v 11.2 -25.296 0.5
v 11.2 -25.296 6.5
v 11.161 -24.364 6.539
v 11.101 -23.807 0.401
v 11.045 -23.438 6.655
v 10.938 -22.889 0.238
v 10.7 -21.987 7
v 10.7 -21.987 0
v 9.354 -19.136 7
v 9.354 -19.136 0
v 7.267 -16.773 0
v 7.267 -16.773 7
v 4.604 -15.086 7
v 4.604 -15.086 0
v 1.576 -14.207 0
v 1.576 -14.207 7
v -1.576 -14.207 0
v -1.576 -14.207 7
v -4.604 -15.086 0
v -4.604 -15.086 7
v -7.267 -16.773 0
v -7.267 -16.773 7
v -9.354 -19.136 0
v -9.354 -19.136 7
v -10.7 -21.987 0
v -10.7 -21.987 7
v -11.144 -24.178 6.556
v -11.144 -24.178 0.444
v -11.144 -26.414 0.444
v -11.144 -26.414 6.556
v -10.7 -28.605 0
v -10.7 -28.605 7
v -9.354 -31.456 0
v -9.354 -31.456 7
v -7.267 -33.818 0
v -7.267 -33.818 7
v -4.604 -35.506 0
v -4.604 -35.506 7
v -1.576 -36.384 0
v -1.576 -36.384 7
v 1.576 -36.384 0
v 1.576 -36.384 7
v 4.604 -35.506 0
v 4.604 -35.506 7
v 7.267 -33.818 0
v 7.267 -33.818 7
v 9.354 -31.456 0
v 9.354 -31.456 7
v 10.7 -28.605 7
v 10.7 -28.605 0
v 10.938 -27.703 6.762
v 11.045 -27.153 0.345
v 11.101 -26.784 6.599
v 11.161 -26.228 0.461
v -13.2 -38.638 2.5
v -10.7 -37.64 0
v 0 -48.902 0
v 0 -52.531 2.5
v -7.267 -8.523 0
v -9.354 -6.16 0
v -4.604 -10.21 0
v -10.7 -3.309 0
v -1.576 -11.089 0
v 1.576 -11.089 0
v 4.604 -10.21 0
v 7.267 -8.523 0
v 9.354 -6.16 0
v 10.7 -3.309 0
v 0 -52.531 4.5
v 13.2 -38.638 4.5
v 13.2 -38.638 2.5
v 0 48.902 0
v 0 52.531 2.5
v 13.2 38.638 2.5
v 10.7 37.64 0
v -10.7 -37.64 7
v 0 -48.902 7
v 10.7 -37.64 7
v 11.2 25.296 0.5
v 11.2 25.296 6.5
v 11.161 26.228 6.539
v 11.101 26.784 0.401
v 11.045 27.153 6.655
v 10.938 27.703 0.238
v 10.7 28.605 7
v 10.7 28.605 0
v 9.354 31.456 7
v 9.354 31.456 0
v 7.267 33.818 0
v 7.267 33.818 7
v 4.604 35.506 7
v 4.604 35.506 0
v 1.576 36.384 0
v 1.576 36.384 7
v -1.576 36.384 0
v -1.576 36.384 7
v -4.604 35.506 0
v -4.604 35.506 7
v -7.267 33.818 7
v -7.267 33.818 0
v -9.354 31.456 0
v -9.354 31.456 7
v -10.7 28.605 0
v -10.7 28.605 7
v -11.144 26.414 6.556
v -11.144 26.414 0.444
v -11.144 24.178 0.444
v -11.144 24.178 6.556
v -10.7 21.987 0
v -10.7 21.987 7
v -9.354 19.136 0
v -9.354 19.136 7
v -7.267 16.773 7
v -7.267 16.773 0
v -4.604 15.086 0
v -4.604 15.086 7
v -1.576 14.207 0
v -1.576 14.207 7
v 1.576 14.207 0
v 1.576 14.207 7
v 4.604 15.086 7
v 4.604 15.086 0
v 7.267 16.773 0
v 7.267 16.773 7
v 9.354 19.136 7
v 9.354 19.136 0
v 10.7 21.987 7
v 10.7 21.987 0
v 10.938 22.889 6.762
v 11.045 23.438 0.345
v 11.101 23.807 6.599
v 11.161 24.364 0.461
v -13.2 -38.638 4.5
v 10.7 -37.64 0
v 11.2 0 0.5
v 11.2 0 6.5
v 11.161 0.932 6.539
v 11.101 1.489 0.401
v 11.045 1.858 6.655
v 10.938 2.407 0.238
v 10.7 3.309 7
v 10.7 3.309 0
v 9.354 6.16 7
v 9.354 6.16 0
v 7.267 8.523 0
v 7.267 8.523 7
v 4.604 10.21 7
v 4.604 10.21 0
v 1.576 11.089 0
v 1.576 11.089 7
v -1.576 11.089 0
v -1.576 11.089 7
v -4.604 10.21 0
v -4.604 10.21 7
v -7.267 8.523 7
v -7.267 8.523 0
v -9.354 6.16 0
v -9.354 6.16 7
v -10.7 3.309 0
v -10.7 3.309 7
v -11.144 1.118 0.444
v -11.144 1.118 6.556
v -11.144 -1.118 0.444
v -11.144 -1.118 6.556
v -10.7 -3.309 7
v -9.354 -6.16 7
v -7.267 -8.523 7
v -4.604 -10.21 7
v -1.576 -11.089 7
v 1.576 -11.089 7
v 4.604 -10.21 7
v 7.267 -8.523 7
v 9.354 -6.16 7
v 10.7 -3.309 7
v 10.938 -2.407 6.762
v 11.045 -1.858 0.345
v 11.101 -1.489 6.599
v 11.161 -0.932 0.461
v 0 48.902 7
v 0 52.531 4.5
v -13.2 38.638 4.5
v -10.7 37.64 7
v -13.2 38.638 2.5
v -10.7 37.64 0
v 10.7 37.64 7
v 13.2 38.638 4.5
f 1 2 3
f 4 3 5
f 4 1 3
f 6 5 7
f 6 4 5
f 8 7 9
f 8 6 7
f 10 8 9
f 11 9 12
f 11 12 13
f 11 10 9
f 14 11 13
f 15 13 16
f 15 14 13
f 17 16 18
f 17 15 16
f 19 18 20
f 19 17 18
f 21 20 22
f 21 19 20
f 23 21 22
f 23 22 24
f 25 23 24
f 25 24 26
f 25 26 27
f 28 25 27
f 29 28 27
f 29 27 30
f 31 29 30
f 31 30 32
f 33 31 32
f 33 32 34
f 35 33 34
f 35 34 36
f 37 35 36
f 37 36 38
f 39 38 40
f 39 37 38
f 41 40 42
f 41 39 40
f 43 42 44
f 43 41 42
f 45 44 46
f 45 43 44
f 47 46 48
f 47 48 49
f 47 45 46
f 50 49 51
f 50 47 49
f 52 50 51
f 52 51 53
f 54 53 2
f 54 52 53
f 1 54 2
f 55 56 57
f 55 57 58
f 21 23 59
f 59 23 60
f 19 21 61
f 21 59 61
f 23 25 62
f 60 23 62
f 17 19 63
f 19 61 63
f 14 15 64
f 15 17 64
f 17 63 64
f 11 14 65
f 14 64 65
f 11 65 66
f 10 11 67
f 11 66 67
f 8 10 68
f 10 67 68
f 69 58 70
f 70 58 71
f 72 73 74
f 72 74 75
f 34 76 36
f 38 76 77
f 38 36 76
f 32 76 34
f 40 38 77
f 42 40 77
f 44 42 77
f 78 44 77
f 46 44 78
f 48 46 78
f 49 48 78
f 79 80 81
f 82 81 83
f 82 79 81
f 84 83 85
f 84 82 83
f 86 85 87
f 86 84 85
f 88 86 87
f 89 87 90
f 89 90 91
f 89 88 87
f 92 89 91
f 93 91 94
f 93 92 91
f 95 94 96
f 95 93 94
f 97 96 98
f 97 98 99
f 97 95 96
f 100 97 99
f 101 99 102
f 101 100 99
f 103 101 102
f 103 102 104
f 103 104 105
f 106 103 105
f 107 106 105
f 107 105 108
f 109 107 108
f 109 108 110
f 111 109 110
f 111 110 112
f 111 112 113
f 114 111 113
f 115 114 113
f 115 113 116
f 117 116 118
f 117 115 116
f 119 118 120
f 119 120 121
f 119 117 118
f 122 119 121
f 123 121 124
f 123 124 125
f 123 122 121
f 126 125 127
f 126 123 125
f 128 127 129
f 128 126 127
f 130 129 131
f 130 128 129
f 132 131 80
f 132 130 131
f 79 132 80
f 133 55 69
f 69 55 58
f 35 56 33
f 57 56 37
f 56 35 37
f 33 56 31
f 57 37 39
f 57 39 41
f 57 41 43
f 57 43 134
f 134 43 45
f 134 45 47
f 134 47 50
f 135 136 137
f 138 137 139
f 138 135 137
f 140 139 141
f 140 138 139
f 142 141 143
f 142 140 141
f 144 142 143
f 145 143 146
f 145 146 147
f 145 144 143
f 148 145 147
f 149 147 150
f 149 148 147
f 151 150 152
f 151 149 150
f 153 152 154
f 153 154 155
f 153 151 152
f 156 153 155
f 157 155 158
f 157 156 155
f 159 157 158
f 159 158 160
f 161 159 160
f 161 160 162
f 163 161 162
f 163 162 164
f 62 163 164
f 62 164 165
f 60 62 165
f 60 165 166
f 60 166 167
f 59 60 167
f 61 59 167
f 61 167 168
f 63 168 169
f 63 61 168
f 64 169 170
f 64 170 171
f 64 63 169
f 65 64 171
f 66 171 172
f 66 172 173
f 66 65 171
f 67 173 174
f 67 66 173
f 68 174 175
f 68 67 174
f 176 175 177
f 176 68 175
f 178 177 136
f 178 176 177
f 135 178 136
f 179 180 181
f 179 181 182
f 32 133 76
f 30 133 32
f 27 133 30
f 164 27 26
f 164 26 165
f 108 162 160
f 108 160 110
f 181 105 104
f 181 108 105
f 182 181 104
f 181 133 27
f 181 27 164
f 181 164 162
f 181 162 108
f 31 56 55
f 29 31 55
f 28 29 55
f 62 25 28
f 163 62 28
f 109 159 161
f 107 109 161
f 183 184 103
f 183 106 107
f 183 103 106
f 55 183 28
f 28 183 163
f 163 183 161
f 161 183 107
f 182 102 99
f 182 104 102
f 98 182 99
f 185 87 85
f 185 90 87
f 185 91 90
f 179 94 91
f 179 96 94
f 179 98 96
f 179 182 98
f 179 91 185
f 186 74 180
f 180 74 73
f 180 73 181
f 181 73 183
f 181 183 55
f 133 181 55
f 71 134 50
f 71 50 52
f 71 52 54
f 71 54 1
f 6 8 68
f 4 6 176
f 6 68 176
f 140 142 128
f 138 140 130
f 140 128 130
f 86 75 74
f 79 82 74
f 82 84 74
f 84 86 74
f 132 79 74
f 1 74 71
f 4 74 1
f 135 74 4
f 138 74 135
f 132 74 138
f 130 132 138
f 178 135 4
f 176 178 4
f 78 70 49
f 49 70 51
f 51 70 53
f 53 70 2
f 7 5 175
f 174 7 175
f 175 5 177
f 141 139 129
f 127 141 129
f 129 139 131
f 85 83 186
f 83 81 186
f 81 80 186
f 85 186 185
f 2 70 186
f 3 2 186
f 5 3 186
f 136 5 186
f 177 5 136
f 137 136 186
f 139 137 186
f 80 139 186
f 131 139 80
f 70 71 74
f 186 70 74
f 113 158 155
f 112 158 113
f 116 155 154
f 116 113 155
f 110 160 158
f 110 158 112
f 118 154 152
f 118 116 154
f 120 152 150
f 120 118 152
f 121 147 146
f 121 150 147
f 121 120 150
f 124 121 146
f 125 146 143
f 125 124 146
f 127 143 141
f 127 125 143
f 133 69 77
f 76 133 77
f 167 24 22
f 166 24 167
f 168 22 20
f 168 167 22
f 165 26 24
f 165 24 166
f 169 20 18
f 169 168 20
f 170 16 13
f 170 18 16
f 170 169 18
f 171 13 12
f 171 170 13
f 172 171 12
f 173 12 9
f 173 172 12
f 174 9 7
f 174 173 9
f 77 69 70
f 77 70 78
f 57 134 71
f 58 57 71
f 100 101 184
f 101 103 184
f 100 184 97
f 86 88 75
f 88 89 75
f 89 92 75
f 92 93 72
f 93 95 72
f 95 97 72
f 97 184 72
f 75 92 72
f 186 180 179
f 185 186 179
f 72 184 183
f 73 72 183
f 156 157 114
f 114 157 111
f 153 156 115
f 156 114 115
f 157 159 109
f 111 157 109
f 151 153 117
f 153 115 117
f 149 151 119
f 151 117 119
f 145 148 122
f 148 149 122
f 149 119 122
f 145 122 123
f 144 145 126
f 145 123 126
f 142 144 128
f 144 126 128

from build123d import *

# Parameters (mm, degrees)
F0_R        = 11.2
F1_DEPTH    = 7
F2_T1_DEPTH = 32.0222283479
F2_T3_DEPTH = 32.0222283479
F2_T5_DEPTH = 90.1351514377
F2_T7_DEPTH = 32.0222283479
F2_T9_DEPTH = 32.0222283479
F3_T1_DEPTH = 32.0222283479
F3_T3_DEPTH = 32.0222283479
F3_T5_DEPTH = 90.1351514377
F3_T7_DEPTH = 32.0222283479
F3_T9_DEPTH = 32.0222283479


# Not quite as in the source:
# - a fillet or chamfer that OpenCascade refuses, or shapes differently, is made with other operations: its cross-section is extruded or revolved along the edge and cut away or added


with BuildPart() as f1:
    # F0 (on Top) → F1 (new body)
    with BuildSketch(Plane.XY):
        with BuildLine():
            ThreePointArc((-13.2, 0), (0, 13.2), (13.2, 0))
            Line((13.2, 0), (13.2, 38.6383682489))
            Line((13.2, 38.6383682489), (0, 52.53123492))
            Line((0, 52.53123492), (-13.2, 38.6383682489))
            Line((-13.2, 38.6383682489), (-13.2, 0))
        make_face()
        with Locations((0, 25.2957735211)):
            Circle(F0_R, mode=Mode.SUBTRACT)
        with BuildLine():
            Line((13.2, -38.6383682489), (13.2, 0))
            ThreePointArc((13.2, 0), (0, -13.2), (-13.2, 0))
            Line((-13.2, 0), (-13.2, -38.6383682489))
            Line((-13.2, -38.6383682489), (0, -52.53123492))
            Line((0, -52.53123492), (13.2, -38.6383682489))
        make_face()
        with Locations((0, -25.2957735211)):
            Circle(F0_R, mode=Mode.SUBTRACT)
        with BuildLine():
            ThreePointArc((-13.2, 0), (0, -13.2), (13.2, 0))
            ThreePointArc((13.2, 0), (0, 13.2), (-13.2, 0))
        make_face()
        Circle(F0_R, mode=Mode.SUBTRACT)
    extrude(amount=F1_DEPTH)

    # F2: chamfer of 2.5 on 6 edges, made by hand

    # F2_s2 → F2_t1 (cut)
    with BuildSketch(Plane(origin=(-30.6597100359, -32.269035129, 0), x_dir=(0, 0, 1), z_dir=(0.6887981906, 0.7249531383, 0))):
        Polygon((4.5, 36.1834195615), (7, 33.6834195615), (7, 36.1834195615), align=None)
    extrude(amount=F2_T1_DEPTH, mode=Mode.SUBTRACT)

    # F2_s4 → F2_t3 (cut)
    with BuildSketch(Plane(origin=(8.6028570917, -9.0544201944, 0), x_dir=(0, 0, 1), z_dir=(0.6887981906, -0.7249531383, 0))):
        Polygon((4.5, 36.1834195615), (7, 33.6834195615), (7, 36.1834195615), align=None)
    extrude(amount=F2_T3_DEPTH, mode=Mode.SUBTRACT)

    # F2_s6 → F2_t5 (cut)
    with BuildSketch(Plane.XZ.offset(-45.0675757189)):
        Polygon((13.2, 4.5), (10.7, 7), (13.2, 7), align=None)
        Polygon((-13.2, 4.5), (-10.7, 7), (-13.2, 7), align=None)
    extrude(amount=F2_T5_DEPTH, mode=Mode.SUBTRACT)

    # F2_s8 → F2_t7 (cut)
    with BuildSketch(Plane(origin=(30.6597100359, 32.269035129, 0), x_dir=(0, 0, 1), z_dir=(-0.6887981906, -0.7249531383, 0))):
        Polygon((4.5, 36.1834195615), (7, 33.6834195615), (7, 36.1834195615), align=None)
    extrude(amount=F2_T7_DEPTH, mode=Mode.SUBTRACT)

    # F2_s10 → F2_t9 (cut)
    with BuildSketch(Plane(origin=(-8.6028570917, 9.0544201944, 0), x_dir=(0, 0, 1), z_dir=(-0.6887981906, 0.7249531383, 0))):
        Polygon((4.5, 36.1834195615), (7, 33.6834195615), (7, 36.1834195615), align=None)
    extrude(amount=F2_T9_DEPTH, mode=Mode.SUBTRACT)

    # F3: chamfer of 2.5 on 6 edges, made by hand

    # F3_s2 → F3_t1 (cut)
    with BuildSketch(Plane(origin=(8.6028570917, -9.0544201944, 0), x_dir=(0, 0, 1), z_dir=(0.6887981906, -0.7249531383, 0))):
        Polygon((0, 33.6834195615), (2.5, 36.1834195615), (0, 36.1834195615), align=None)
    extrude(amount=F3_T1_DEPTH, mode=Mode.SUBTRACT)

    # F3_s4 → F3_t3 (cut)
    with BuildSketch(Plane(origin=(-30.6597100359, -32.269035129, 0), x_dir=(0, 0, 1), z_dir=(0.6887981906, 0.7249531383, 0))):
        Polygon((0, 33.6834195615), (2.5, 36.1834195615), (0, 36.1834195615), align=None)
    extrude(amount=F3_T3_DEPTH, mode=Mode.SUBTRACT)

    # F3_s6 → F3_t5 (cut)
    with BuildSketch(Plane.XZ.offset(-45.0675757189)):
        Polygon((10.7, 0), (13.2, 2.5), (13.2, 0), align=None)
        Polygon((-10.7, 0), (-13.2, 2.5), (-13.2, 0), align=None)
    extrude(amount=F3_T5_DEPTH, mode=Mode.SUBTRACT)

    # F3_s8 → F3_t7 (cut)
    with BuildSketch(Plane(origin=(30.6597100359, 32.269035129, 0), x_dir=(0, 0, 1), z_dir=(-0.6887981906, -0.7249531383, 0))):
        Polygon((0, 33.6834195615), (2.5, 36.1834195615), (0, 36.1834195615), align=None)
    extrude(amount=F3_T7_DEPTH, mode=Mode.SUBTRACT)

    # F3_s10 → F3_t9 (cut)
    with BuildSketch(Plane(origin=(-8.6028570917, 9.0544201944, 0), x_dir=(0, 0, 1), z_dir=(-0.6887981906, 0.7249531383, 0))):
        Polygon((2.5, 36.1834195615), (0, 33.6834195615), (0, 36.1834195615), align=None)
    extrude(amount=F3_T9_DEPTH, mode=Mode.SUBTRACT)


solid = f1.part
